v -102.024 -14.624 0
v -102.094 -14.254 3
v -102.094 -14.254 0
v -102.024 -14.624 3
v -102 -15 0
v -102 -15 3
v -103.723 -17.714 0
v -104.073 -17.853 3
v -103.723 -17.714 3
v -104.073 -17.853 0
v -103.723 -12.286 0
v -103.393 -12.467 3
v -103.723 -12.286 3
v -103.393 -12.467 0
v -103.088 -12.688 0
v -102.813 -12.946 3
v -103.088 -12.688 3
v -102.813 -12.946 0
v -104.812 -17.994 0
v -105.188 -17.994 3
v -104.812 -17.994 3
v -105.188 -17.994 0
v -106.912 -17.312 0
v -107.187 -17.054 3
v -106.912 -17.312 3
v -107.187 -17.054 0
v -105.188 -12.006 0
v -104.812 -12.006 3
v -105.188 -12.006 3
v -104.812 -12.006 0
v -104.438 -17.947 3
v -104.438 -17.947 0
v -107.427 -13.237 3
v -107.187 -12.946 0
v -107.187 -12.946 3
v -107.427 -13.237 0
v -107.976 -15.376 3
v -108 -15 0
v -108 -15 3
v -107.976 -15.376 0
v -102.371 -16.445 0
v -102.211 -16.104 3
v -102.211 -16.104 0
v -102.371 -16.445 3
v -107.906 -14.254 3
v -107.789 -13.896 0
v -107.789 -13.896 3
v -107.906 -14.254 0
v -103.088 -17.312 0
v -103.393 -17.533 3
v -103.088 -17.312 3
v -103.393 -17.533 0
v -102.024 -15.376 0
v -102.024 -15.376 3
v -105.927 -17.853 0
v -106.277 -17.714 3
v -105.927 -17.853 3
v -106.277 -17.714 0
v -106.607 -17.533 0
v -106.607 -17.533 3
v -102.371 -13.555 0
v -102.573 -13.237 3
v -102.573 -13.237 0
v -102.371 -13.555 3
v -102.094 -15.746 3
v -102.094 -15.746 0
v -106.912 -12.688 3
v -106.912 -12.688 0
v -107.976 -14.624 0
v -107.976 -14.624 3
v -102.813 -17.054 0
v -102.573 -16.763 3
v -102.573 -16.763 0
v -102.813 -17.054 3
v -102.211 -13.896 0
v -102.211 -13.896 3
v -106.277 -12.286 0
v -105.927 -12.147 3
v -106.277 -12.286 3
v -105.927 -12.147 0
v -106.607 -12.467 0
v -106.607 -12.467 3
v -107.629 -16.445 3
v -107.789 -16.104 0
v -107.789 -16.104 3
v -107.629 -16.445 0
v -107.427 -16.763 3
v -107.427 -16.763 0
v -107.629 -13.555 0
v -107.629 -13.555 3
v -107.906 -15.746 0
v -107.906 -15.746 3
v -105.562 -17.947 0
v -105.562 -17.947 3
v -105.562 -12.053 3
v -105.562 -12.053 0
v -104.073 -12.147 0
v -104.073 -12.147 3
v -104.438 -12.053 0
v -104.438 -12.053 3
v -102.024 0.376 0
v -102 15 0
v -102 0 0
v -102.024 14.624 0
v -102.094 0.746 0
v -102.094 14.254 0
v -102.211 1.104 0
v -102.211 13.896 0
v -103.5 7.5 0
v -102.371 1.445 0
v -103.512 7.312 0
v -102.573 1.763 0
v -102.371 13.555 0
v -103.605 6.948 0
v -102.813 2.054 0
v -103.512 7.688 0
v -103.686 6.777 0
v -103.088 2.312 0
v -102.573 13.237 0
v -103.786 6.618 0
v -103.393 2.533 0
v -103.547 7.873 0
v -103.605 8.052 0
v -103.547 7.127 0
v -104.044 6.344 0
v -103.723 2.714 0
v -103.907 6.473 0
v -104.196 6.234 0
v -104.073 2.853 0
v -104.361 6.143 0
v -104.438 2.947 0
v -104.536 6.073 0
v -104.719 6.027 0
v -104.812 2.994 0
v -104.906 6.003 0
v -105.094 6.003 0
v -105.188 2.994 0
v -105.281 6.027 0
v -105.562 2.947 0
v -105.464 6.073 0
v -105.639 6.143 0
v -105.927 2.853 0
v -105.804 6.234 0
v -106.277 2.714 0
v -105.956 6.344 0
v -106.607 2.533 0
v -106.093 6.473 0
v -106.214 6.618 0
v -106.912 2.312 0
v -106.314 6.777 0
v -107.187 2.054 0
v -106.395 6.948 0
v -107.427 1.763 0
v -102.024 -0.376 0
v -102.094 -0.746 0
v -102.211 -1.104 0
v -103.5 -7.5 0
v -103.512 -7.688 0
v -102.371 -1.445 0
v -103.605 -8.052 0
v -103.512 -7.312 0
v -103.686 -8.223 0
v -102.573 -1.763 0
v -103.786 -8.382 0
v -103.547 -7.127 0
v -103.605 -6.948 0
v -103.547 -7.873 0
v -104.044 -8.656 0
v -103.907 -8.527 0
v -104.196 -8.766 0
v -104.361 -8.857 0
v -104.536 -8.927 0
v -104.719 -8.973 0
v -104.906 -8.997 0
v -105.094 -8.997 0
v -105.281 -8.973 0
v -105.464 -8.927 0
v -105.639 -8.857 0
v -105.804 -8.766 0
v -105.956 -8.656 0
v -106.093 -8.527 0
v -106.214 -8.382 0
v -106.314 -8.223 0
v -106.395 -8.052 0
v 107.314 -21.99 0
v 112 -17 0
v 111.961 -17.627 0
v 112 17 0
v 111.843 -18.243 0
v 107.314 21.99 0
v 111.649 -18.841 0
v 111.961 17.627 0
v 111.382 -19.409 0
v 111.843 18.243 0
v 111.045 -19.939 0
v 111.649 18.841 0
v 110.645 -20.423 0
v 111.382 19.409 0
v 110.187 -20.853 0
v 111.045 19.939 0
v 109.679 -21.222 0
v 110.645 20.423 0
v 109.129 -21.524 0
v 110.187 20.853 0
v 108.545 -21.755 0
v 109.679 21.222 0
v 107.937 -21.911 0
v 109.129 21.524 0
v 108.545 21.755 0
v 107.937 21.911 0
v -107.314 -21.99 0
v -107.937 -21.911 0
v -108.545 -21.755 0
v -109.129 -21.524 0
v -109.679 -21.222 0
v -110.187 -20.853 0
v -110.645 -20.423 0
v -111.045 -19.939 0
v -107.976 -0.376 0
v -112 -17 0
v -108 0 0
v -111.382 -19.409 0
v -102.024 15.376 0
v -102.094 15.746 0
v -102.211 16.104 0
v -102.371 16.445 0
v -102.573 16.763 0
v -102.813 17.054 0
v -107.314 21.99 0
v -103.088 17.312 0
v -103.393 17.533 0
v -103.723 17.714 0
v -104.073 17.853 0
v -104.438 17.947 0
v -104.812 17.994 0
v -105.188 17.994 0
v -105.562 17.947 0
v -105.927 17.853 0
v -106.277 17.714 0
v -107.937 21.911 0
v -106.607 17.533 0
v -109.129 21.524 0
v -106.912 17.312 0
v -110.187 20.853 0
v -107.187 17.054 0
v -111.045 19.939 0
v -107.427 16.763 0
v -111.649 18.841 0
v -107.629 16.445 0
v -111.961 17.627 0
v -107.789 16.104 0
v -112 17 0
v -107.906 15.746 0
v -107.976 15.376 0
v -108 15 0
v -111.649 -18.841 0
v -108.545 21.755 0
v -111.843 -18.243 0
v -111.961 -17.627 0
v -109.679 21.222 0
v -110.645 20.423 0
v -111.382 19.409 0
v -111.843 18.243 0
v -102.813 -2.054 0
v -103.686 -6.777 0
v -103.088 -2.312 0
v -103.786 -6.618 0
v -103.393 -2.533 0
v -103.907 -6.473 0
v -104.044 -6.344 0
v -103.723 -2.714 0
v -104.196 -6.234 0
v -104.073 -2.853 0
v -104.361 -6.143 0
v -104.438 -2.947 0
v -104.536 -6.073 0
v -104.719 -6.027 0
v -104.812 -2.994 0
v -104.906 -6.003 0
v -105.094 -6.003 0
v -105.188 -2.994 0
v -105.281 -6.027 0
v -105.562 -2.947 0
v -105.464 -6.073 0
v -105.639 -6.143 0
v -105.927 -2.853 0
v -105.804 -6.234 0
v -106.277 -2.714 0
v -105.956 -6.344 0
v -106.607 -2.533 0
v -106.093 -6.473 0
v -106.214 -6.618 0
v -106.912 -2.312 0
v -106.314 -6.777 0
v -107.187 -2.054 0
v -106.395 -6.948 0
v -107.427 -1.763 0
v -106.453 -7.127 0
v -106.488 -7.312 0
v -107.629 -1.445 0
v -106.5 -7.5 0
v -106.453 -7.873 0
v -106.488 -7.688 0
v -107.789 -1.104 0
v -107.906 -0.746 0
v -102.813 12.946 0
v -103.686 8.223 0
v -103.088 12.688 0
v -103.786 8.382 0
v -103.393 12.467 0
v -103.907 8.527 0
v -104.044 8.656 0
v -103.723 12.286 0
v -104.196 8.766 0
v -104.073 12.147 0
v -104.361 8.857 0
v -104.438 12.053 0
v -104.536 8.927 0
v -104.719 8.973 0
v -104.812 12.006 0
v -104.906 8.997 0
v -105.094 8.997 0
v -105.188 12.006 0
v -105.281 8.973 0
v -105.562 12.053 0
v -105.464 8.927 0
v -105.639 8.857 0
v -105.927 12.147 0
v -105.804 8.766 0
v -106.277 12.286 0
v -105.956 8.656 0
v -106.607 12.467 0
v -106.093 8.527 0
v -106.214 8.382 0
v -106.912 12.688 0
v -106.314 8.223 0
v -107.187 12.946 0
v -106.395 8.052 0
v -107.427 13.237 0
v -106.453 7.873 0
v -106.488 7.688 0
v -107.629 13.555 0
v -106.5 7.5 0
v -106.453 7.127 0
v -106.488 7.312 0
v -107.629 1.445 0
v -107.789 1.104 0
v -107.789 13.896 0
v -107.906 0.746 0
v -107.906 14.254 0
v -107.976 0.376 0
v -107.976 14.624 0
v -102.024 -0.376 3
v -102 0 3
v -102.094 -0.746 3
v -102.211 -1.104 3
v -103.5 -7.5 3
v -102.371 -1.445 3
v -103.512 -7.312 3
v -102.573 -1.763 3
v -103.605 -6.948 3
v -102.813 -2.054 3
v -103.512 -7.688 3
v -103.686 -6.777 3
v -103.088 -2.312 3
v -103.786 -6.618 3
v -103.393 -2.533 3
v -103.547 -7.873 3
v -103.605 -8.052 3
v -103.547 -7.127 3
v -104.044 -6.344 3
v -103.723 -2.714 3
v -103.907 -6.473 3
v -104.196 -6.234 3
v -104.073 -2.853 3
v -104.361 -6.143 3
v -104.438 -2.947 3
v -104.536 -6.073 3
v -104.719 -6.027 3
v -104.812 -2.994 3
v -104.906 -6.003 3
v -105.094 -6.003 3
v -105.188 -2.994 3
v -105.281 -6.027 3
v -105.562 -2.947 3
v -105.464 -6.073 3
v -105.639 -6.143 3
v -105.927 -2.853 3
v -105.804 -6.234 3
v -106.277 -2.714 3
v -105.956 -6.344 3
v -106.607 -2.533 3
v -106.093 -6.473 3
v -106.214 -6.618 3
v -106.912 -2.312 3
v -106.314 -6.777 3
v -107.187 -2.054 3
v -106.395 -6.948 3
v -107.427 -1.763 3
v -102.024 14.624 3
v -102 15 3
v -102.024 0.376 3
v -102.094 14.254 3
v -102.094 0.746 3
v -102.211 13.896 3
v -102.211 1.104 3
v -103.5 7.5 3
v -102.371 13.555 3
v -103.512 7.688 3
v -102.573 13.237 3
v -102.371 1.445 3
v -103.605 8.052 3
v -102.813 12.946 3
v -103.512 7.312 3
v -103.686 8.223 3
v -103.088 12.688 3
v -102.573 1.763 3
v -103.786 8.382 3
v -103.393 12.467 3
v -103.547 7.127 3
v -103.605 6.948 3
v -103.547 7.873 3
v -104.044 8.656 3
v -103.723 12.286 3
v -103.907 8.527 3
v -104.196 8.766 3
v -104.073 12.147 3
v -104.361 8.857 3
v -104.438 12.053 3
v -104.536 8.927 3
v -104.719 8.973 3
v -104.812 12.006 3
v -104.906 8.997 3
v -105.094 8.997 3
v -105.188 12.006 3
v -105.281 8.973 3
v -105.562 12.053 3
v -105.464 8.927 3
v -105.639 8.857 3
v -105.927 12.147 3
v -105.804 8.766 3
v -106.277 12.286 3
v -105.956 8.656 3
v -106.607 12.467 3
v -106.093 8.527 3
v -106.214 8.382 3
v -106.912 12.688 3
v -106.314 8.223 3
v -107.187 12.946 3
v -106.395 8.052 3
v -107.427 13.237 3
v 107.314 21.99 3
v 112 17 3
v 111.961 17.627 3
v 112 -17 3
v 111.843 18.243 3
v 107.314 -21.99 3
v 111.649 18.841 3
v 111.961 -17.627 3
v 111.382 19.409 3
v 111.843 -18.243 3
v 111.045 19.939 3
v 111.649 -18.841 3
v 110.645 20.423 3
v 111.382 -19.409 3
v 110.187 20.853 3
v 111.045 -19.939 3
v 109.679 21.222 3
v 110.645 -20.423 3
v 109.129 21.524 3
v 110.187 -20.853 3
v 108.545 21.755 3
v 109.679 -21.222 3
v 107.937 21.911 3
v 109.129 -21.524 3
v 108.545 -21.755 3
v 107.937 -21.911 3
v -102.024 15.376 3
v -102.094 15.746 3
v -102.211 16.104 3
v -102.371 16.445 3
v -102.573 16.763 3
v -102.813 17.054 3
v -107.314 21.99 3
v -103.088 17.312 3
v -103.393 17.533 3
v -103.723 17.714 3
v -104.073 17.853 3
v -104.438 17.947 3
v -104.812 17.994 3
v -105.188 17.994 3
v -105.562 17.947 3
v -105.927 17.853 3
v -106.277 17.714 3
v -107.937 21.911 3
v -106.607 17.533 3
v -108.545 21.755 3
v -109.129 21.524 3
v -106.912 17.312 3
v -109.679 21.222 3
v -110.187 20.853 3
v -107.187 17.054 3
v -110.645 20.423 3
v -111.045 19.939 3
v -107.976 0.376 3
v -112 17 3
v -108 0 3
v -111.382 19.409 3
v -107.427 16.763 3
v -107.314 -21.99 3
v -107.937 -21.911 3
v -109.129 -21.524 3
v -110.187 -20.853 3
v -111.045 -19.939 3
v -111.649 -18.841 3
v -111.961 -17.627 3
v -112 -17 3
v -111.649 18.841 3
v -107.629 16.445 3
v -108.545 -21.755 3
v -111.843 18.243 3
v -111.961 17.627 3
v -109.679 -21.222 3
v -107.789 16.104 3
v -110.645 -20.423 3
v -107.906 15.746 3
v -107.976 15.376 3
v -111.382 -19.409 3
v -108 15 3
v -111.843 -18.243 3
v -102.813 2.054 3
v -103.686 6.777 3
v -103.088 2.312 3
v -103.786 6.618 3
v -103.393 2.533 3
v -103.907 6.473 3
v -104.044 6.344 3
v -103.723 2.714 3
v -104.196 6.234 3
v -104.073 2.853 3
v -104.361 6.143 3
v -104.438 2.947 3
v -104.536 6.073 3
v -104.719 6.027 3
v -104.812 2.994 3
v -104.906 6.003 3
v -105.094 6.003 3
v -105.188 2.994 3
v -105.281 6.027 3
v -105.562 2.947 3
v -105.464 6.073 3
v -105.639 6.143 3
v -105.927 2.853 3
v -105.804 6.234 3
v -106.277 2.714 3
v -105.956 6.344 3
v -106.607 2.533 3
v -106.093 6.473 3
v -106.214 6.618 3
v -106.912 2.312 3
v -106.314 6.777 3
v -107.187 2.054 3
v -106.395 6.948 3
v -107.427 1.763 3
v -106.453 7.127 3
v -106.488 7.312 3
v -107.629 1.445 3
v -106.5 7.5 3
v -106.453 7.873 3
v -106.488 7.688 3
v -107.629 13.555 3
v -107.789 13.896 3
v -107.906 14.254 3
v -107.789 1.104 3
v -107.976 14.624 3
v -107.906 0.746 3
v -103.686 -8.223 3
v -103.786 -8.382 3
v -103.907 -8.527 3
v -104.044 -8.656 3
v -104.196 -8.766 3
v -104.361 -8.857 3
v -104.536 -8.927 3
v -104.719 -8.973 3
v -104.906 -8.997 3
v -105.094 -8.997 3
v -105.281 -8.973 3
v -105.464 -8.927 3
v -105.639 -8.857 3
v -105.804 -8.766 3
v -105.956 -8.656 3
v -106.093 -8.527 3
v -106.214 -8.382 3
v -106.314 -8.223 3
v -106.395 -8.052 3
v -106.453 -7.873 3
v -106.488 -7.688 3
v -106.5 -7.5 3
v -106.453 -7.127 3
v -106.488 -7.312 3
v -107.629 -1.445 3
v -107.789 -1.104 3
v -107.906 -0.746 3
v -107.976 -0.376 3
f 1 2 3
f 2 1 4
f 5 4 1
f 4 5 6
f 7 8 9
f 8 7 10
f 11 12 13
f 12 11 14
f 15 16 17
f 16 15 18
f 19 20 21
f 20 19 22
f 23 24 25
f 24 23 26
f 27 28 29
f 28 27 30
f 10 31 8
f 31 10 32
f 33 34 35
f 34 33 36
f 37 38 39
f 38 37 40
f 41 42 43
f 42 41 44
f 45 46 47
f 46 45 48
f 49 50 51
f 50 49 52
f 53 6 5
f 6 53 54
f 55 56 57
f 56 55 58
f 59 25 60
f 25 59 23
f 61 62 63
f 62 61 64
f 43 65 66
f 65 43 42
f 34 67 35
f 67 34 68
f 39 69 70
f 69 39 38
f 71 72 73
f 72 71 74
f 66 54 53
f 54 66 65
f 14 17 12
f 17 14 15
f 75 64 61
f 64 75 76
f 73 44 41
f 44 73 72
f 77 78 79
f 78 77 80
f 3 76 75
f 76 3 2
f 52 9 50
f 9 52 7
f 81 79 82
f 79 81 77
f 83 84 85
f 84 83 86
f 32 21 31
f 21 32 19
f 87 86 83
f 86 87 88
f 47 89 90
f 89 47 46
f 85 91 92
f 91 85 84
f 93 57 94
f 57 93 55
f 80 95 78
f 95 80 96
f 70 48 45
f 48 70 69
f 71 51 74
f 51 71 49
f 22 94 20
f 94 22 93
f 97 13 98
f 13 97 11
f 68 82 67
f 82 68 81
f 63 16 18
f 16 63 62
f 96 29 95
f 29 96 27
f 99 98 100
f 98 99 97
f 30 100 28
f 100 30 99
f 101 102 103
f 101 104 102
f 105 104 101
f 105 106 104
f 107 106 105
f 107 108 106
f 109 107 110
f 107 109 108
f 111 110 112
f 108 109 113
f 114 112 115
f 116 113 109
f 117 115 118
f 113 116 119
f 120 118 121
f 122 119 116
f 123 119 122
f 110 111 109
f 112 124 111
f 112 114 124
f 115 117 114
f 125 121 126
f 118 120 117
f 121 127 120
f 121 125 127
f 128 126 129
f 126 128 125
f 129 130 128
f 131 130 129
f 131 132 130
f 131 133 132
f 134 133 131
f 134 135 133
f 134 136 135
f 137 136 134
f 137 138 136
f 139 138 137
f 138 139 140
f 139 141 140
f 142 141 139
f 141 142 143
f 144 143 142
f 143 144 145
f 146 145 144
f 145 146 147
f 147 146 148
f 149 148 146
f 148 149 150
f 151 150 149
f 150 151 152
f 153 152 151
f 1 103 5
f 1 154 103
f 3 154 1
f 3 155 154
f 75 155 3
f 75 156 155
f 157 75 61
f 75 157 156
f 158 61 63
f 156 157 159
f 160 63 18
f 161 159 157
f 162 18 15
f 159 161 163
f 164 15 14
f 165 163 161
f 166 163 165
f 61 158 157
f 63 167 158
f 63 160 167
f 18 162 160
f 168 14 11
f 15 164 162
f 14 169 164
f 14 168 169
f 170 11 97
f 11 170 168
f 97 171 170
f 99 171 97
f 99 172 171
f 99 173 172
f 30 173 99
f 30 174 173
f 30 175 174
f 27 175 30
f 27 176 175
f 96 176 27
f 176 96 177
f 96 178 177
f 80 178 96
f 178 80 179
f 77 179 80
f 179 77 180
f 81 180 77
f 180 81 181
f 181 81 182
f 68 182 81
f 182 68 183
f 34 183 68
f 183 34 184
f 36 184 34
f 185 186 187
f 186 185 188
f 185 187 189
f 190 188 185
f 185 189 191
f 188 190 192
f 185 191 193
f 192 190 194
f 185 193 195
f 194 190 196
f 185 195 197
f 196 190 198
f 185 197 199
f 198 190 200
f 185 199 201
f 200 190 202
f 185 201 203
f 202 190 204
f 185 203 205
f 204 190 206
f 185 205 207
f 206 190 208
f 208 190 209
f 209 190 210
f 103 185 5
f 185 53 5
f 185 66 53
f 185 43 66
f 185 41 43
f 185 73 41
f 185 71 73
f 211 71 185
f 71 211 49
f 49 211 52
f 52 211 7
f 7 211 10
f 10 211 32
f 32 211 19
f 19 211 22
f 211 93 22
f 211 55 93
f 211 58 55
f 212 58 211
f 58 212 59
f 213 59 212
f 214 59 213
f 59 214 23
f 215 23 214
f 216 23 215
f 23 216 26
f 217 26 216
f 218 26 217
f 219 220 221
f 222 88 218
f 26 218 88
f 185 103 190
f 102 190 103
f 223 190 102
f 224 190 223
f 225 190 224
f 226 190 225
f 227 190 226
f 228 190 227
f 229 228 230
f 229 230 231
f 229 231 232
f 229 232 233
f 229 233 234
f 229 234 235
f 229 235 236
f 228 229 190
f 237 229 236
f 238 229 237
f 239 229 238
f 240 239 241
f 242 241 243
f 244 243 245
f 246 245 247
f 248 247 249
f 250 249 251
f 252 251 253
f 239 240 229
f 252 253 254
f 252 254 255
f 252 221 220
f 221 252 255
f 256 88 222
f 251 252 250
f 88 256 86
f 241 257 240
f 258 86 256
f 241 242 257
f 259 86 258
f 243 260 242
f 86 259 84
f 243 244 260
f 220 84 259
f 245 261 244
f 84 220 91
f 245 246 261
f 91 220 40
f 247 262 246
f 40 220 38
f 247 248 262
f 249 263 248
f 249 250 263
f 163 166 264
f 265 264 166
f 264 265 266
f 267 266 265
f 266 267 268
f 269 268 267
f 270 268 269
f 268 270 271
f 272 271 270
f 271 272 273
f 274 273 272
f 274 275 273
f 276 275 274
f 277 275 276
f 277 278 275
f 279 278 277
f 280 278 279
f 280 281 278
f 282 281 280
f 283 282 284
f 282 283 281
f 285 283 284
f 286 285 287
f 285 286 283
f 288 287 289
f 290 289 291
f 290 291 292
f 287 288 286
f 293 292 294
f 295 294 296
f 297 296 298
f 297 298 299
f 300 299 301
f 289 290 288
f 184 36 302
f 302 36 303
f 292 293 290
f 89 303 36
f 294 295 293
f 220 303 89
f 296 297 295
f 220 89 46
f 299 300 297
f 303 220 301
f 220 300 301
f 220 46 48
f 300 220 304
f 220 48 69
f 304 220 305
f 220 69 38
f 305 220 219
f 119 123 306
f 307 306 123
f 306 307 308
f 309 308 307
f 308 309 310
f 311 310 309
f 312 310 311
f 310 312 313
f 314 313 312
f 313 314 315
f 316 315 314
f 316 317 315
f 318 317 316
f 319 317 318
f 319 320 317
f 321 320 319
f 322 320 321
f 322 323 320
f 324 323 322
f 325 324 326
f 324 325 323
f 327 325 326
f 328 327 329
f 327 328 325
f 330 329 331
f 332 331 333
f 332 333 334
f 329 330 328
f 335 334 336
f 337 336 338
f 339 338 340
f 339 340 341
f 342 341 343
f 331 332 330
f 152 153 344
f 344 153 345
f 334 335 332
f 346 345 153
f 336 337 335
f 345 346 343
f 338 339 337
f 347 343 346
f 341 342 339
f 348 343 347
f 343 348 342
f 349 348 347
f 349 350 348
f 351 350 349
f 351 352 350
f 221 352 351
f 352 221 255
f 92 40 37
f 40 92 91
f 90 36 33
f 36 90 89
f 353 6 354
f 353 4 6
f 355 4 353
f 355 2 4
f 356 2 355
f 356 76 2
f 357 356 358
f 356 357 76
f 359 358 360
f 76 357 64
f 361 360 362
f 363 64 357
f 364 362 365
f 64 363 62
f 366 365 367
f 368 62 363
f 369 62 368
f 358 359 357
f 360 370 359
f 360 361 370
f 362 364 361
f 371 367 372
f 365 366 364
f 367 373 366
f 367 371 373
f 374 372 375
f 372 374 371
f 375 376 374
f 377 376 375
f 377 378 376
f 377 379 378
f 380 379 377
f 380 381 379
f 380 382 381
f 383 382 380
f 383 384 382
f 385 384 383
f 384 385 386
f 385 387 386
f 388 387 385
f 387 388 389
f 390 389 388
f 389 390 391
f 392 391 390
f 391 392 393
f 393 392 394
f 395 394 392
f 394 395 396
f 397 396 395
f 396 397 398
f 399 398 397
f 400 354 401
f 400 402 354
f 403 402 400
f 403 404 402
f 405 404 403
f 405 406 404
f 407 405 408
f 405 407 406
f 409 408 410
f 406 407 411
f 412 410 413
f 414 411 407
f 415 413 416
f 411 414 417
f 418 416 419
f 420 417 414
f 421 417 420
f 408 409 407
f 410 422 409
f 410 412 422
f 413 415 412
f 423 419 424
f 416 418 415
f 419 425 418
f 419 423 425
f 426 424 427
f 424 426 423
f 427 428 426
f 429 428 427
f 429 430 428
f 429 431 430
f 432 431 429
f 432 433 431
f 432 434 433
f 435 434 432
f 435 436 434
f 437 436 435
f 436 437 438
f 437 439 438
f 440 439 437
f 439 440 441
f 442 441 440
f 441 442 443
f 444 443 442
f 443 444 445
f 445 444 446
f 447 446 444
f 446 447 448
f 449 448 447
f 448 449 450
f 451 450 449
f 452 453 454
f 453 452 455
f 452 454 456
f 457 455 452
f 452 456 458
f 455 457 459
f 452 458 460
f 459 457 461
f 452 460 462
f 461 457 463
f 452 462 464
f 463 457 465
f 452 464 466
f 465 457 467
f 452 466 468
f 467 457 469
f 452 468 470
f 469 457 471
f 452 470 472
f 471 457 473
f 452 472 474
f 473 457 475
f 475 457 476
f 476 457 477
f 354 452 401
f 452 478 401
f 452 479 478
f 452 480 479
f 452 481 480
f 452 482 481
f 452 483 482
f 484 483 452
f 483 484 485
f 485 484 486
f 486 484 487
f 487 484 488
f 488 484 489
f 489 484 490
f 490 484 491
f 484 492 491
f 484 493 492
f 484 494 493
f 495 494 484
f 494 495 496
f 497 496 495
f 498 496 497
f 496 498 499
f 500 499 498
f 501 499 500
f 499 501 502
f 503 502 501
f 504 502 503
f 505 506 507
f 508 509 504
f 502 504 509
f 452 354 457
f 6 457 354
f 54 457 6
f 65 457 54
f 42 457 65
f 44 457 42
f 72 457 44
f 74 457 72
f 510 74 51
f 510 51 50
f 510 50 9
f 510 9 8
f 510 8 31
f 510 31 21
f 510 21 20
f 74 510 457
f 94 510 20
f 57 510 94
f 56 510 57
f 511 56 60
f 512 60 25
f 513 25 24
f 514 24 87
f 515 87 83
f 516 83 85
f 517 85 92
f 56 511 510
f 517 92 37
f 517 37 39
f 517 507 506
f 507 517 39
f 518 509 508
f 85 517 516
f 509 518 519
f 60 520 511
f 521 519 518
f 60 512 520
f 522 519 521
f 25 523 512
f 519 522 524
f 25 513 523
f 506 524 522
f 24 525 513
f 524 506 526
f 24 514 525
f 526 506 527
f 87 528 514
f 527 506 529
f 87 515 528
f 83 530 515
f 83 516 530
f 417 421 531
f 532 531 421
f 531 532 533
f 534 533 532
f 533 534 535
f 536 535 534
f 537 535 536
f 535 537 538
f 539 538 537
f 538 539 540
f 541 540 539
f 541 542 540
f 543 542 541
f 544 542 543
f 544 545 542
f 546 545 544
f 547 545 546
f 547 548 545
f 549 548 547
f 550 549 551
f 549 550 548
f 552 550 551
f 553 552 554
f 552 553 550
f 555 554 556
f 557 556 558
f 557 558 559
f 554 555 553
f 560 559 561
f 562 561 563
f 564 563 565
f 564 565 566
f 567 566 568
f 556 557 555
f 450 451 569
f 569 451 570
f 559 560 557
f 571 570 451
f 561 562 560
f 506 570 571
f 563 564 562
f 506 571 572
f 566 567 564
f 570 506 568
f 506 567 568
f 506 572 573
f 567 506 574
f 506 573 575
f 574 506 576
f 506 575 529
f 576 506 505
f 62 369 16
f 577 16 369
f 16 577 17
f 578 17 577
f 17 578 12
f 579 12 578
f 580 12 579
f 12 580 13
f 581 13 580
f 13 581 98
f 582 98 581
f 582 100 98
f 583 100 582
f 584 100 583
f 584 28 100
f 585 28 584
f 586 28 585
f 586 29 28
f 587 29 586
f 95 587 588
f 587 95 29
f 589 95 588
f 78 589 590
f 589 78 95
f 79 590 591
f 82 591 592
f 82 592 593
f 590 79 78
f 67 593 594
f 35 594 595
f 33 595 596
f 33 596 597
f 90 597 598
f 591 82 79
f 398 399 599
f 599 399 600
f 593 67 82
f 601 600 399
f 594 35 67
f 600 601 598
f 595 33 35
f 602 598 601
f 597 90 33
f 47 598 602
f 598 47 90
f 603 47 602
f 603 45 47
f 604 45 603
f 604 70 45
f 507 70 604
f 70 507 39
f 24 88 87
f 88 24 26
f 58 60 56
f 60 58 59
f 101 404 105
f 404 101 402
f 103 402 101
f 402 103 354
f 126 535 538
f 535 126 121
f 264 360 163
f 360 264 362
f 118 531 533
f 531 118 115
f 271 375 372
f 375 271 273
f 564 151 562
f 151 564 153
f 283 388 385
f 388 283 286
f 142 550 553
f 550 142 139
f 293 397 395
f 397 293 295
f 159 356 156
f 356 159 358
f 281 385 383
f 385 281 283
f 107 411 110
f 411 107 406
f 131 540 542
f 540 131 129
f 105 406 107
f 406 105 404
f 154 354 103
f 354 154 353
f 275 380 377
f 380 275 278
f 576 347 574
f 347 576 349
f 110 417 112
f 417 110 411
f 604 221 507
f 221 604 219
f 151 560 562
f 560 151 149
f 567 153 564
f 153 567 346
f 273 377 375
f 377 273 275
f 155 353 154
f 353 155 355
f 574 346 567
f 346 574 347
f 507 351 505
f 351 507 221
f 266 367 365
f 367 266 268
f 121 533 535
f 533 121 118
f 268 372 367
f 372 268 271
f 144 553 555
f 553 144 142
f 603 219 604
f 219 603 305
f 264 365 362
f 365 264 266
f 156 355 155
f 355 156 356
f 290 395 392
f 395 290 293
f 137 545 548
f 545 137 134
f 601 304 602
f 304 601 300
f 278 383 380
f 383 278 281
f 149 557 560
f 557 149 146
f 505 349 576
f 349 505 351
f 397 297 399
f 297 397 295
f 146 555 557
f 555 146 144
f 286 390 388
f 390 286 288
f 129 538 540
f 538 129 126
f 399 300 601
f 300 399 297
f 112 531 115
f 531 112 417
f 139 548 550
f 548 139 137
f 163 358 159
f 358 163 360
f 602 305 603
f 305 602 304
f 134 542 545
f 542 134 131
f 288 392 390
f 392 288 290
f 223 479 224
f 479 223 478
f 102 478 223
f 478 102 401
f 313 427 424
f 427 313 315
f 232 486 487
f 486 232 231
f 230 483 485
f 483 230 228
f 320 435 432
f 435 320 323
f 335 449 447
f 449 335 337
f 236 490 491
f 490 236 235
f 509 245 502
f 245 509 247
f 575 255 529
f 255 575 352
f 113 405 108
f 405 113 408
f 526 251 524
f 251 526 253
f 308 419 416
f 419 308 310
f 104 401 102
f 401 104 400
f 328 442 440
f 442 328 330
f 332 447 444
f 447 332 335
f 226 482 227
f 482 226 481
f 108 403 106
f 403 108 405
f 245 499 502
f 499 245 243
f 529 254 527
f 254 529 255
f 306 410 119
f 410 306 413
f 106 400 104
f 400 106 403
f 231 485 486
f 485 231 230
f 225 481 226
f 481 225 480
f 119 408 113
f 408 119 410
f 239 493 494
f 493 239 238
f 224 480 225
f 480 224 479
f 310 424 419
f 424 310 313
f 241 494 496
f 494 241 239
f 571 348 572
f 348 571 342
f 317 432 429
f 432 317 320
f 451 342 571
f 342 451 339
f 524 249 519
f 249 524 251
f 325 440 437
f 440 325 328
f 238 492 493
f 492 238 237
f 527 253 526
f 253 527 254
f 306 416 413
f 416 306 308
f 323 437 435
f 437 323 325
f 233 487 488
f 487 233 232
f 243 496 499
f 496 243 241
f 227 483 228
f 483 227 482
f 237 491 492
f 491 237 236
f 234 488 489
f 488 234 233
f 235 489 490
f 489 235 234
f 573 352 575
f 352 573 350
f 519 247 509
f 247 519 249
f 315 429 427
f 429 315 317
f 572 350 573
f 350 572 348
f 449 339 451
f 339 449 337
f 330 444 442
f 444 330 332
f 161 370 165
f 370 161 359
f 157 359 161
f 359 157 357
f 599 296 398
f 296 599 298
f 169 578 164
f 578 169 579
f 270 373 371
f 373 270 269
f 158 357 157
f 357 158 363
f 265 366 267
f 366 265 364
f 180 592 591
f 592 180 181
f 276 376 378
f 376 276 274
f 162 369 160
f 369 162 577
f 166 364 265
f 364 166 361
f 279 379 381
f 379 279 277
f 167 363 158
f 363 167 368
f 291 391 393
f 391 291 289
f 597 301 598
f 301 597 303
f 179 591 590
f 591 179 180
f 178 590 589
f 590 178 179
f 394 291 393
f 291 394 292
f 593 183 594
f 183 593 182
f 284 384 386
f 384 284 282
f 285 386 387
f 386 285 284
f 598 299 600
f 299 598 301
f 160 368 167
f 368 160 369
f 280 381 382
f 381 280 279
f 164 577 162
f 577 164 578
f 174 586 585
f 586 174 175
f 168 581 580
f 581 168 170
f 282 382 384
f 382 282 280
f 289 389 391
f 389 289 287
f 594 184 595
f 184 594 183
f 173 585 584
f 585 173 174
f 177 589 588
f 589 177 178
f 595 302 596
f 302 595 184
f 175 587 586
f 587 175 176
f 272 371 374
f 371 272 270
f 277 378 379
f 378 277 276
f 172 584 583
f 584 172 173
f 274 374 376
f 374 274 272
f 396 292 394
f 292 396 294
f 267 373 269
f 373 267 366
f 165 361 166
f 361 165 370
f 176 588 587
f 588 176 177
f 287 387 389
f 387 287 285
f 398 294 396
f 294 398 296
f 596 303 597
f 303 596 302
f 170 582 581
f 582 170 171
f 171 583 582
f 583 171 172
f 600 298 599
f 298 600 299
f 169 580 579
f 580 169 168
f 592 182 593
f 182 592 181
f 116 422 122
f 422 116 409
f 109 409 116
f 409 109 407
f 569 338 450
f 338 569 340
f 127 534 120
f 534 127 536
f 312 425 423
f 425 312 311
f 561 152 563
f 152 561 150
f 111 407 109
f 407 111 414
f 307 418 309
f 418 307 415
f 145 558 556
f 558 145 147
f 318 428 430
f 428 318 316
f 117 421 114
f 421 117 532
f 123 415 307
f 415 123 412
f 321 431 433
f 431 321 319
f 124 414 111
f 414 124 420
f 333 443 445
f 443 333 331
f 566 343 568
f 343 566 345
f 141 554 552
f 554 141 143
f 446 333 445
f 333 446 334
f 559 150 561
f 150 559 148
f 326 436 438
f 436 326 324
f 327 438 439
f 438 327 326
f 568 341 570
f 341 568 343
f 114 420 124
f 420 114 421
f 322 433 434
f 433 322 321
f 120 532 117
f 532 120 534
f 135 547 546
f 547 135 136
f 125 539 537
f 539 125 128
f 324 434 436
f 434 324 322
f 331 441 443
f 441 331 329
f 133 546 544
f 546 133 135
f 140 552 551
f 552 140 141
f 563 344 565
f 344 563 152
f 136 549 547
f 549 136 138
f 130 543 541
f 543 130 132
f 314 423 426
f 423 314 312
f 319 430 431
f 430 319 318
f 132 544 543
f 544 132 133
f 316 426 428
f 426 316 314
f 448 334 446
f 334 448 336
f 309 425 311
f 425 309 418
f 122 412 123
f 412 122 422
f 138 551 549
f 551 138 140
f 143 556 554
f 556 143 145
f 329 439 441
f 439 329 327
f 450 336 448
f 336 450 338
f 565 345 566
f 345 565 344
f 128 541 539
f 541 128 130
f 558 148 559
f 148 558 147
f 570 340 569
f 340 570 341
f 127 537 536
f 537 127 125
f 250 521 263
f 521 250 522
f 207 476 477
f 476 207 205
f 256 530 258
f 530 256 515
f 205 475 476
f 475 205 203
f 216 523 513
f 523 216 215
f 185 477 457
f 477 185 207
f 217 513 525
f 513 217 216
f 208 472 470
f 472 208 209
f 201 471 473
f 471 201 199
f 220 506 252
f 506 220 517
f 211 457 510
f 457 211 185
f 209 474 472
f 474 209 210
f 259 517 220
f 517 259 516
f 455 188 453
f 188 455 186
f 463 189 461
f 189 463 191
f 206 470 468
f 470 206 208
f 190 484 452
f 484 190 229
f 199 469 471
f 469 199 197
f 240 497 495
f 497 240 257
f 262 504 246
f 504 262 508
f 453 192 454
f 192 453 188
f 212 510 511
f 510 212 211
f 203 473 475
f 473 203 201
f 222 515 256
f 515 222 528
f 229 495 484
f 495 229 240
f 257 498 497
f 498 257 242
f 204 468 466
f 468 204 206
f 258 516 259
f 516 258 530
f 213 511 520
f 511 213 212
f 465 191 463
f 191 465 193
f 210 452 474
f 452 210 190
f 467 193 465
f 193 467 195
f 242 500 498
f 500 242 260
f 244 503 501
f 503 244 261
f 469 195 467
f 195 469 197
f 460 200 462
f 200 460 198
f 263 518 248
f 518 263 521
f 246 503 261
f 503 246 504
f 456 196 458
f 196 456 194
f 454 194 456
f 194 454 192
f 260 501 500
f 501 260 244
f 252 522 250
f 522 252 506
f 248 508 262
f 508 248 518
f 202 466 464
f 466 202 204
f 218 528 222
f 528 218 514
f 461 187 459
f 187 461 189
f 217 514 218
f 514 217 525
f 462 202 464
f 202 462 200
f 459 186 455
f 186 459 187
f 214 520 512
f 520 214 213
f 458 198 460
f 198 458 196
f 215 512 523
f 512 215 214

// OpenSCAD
$fn = 50;


difference() {
	union() {
		hull() {
			translate(v = [-107.0000000000, 17.0000000000, 0]) {
				cylinder(h = 3, r = 5);
			}
			translate(v = [107.0000000000, 17.0000000000, 0]) {
				cylinder(h = 3, r = 5);
			}
			translate(v = [-107.0000000000, -17.0000000000, 0]) {
				cylinder(h = 3, r = 5);
			}
			translate(v = [107.0000000000, -17.0000000000, 0]) {
				cylinder(h = 3, r = 5);
			}
		}
	}
	union() {
		translate(v = [-105.0000000000, -15.0000000000, 0]) {
			cylinder(h = 3, r = 3.0000000000);
		}
		translate(v = [-105.0000000000, 0.0000000000, 0]) {
			cylinder(h = 3, r = 3.0000000000);
		}
		translate(v = [-105.0000000000, 15.0000000000, 0]) {
			cylinder(h = 3, r = 3.0000000000);
		}
		translate(v = [-105.0000000000, -15.0000000000, 0]) {
			cylinder(h = 3, r = 1.5000000000);
		}
		translate(v = [-105.0000000000, -7.5000000000, 0]) {
			cylinder(h = 3, r = 1.5000000000);
		}
		translate(v = [-105.0000000000, 0.0000000000, 0]) {
			cylinder(h = 3, r = 1.5000000000);
		}
		translate(v = [-105.0000000000, 7.5000000000, 0]) {
			cylinder(h = 3, r = 1.5000000000);
		}
		translate(v = [-105.0000000000, 15.0000000000, 0]) {
			cylinder(h = 3, r = 1.5000000000);
		}
		translate(v = [-105.0000000000, -15.0000000000, 0]) {
			cylinder(h = 3, r = 1.5000000000);
		}
		translate(v = [-105.0000000000, -7.5000000000, 0]) {
			cylinder(h = 3, r = 1.5000000000);
		}
		translate(v = [-105.0000000000, 0.0000000000, 0]) {
			cylinder(h = 3, r = 1.5000000000);
		}
		translate(v = [-105.0000000000, 7.5000000000, 0]) {
			cylinder(h = 3, r = 1.5000000000);
		}
		translate(v = [-105.0000000000, 15.0000000000, 0]) {
			cylinder(h = 3, r = 1.5000000000);
		}
		translate(v = [-105.0000000000, -15.0000000000, 0]) {
			cylinder(h = 3, r = 1.5000000000);
		}
		translate(v = [-105.0000000000, -7.5000000000, 0]) {
			cylinder(h = 3, r = 1.5000000000);
		}
		translate(v = [-105.0000000000, 0.0000000000, 0]) {
			cylinder(h = 3, r = 1.5000000000);
		}
		translate(v = [-105.0000000000, 7.5000000000, 0]) {
			cylinder(h = 3, r = 1.5000000000);
		}
		translate(v = [-105.0000000000, 15.0000000000, 0]) {
			cylinder(h = 3, r = 1.5000000000);
		}
	}
}
